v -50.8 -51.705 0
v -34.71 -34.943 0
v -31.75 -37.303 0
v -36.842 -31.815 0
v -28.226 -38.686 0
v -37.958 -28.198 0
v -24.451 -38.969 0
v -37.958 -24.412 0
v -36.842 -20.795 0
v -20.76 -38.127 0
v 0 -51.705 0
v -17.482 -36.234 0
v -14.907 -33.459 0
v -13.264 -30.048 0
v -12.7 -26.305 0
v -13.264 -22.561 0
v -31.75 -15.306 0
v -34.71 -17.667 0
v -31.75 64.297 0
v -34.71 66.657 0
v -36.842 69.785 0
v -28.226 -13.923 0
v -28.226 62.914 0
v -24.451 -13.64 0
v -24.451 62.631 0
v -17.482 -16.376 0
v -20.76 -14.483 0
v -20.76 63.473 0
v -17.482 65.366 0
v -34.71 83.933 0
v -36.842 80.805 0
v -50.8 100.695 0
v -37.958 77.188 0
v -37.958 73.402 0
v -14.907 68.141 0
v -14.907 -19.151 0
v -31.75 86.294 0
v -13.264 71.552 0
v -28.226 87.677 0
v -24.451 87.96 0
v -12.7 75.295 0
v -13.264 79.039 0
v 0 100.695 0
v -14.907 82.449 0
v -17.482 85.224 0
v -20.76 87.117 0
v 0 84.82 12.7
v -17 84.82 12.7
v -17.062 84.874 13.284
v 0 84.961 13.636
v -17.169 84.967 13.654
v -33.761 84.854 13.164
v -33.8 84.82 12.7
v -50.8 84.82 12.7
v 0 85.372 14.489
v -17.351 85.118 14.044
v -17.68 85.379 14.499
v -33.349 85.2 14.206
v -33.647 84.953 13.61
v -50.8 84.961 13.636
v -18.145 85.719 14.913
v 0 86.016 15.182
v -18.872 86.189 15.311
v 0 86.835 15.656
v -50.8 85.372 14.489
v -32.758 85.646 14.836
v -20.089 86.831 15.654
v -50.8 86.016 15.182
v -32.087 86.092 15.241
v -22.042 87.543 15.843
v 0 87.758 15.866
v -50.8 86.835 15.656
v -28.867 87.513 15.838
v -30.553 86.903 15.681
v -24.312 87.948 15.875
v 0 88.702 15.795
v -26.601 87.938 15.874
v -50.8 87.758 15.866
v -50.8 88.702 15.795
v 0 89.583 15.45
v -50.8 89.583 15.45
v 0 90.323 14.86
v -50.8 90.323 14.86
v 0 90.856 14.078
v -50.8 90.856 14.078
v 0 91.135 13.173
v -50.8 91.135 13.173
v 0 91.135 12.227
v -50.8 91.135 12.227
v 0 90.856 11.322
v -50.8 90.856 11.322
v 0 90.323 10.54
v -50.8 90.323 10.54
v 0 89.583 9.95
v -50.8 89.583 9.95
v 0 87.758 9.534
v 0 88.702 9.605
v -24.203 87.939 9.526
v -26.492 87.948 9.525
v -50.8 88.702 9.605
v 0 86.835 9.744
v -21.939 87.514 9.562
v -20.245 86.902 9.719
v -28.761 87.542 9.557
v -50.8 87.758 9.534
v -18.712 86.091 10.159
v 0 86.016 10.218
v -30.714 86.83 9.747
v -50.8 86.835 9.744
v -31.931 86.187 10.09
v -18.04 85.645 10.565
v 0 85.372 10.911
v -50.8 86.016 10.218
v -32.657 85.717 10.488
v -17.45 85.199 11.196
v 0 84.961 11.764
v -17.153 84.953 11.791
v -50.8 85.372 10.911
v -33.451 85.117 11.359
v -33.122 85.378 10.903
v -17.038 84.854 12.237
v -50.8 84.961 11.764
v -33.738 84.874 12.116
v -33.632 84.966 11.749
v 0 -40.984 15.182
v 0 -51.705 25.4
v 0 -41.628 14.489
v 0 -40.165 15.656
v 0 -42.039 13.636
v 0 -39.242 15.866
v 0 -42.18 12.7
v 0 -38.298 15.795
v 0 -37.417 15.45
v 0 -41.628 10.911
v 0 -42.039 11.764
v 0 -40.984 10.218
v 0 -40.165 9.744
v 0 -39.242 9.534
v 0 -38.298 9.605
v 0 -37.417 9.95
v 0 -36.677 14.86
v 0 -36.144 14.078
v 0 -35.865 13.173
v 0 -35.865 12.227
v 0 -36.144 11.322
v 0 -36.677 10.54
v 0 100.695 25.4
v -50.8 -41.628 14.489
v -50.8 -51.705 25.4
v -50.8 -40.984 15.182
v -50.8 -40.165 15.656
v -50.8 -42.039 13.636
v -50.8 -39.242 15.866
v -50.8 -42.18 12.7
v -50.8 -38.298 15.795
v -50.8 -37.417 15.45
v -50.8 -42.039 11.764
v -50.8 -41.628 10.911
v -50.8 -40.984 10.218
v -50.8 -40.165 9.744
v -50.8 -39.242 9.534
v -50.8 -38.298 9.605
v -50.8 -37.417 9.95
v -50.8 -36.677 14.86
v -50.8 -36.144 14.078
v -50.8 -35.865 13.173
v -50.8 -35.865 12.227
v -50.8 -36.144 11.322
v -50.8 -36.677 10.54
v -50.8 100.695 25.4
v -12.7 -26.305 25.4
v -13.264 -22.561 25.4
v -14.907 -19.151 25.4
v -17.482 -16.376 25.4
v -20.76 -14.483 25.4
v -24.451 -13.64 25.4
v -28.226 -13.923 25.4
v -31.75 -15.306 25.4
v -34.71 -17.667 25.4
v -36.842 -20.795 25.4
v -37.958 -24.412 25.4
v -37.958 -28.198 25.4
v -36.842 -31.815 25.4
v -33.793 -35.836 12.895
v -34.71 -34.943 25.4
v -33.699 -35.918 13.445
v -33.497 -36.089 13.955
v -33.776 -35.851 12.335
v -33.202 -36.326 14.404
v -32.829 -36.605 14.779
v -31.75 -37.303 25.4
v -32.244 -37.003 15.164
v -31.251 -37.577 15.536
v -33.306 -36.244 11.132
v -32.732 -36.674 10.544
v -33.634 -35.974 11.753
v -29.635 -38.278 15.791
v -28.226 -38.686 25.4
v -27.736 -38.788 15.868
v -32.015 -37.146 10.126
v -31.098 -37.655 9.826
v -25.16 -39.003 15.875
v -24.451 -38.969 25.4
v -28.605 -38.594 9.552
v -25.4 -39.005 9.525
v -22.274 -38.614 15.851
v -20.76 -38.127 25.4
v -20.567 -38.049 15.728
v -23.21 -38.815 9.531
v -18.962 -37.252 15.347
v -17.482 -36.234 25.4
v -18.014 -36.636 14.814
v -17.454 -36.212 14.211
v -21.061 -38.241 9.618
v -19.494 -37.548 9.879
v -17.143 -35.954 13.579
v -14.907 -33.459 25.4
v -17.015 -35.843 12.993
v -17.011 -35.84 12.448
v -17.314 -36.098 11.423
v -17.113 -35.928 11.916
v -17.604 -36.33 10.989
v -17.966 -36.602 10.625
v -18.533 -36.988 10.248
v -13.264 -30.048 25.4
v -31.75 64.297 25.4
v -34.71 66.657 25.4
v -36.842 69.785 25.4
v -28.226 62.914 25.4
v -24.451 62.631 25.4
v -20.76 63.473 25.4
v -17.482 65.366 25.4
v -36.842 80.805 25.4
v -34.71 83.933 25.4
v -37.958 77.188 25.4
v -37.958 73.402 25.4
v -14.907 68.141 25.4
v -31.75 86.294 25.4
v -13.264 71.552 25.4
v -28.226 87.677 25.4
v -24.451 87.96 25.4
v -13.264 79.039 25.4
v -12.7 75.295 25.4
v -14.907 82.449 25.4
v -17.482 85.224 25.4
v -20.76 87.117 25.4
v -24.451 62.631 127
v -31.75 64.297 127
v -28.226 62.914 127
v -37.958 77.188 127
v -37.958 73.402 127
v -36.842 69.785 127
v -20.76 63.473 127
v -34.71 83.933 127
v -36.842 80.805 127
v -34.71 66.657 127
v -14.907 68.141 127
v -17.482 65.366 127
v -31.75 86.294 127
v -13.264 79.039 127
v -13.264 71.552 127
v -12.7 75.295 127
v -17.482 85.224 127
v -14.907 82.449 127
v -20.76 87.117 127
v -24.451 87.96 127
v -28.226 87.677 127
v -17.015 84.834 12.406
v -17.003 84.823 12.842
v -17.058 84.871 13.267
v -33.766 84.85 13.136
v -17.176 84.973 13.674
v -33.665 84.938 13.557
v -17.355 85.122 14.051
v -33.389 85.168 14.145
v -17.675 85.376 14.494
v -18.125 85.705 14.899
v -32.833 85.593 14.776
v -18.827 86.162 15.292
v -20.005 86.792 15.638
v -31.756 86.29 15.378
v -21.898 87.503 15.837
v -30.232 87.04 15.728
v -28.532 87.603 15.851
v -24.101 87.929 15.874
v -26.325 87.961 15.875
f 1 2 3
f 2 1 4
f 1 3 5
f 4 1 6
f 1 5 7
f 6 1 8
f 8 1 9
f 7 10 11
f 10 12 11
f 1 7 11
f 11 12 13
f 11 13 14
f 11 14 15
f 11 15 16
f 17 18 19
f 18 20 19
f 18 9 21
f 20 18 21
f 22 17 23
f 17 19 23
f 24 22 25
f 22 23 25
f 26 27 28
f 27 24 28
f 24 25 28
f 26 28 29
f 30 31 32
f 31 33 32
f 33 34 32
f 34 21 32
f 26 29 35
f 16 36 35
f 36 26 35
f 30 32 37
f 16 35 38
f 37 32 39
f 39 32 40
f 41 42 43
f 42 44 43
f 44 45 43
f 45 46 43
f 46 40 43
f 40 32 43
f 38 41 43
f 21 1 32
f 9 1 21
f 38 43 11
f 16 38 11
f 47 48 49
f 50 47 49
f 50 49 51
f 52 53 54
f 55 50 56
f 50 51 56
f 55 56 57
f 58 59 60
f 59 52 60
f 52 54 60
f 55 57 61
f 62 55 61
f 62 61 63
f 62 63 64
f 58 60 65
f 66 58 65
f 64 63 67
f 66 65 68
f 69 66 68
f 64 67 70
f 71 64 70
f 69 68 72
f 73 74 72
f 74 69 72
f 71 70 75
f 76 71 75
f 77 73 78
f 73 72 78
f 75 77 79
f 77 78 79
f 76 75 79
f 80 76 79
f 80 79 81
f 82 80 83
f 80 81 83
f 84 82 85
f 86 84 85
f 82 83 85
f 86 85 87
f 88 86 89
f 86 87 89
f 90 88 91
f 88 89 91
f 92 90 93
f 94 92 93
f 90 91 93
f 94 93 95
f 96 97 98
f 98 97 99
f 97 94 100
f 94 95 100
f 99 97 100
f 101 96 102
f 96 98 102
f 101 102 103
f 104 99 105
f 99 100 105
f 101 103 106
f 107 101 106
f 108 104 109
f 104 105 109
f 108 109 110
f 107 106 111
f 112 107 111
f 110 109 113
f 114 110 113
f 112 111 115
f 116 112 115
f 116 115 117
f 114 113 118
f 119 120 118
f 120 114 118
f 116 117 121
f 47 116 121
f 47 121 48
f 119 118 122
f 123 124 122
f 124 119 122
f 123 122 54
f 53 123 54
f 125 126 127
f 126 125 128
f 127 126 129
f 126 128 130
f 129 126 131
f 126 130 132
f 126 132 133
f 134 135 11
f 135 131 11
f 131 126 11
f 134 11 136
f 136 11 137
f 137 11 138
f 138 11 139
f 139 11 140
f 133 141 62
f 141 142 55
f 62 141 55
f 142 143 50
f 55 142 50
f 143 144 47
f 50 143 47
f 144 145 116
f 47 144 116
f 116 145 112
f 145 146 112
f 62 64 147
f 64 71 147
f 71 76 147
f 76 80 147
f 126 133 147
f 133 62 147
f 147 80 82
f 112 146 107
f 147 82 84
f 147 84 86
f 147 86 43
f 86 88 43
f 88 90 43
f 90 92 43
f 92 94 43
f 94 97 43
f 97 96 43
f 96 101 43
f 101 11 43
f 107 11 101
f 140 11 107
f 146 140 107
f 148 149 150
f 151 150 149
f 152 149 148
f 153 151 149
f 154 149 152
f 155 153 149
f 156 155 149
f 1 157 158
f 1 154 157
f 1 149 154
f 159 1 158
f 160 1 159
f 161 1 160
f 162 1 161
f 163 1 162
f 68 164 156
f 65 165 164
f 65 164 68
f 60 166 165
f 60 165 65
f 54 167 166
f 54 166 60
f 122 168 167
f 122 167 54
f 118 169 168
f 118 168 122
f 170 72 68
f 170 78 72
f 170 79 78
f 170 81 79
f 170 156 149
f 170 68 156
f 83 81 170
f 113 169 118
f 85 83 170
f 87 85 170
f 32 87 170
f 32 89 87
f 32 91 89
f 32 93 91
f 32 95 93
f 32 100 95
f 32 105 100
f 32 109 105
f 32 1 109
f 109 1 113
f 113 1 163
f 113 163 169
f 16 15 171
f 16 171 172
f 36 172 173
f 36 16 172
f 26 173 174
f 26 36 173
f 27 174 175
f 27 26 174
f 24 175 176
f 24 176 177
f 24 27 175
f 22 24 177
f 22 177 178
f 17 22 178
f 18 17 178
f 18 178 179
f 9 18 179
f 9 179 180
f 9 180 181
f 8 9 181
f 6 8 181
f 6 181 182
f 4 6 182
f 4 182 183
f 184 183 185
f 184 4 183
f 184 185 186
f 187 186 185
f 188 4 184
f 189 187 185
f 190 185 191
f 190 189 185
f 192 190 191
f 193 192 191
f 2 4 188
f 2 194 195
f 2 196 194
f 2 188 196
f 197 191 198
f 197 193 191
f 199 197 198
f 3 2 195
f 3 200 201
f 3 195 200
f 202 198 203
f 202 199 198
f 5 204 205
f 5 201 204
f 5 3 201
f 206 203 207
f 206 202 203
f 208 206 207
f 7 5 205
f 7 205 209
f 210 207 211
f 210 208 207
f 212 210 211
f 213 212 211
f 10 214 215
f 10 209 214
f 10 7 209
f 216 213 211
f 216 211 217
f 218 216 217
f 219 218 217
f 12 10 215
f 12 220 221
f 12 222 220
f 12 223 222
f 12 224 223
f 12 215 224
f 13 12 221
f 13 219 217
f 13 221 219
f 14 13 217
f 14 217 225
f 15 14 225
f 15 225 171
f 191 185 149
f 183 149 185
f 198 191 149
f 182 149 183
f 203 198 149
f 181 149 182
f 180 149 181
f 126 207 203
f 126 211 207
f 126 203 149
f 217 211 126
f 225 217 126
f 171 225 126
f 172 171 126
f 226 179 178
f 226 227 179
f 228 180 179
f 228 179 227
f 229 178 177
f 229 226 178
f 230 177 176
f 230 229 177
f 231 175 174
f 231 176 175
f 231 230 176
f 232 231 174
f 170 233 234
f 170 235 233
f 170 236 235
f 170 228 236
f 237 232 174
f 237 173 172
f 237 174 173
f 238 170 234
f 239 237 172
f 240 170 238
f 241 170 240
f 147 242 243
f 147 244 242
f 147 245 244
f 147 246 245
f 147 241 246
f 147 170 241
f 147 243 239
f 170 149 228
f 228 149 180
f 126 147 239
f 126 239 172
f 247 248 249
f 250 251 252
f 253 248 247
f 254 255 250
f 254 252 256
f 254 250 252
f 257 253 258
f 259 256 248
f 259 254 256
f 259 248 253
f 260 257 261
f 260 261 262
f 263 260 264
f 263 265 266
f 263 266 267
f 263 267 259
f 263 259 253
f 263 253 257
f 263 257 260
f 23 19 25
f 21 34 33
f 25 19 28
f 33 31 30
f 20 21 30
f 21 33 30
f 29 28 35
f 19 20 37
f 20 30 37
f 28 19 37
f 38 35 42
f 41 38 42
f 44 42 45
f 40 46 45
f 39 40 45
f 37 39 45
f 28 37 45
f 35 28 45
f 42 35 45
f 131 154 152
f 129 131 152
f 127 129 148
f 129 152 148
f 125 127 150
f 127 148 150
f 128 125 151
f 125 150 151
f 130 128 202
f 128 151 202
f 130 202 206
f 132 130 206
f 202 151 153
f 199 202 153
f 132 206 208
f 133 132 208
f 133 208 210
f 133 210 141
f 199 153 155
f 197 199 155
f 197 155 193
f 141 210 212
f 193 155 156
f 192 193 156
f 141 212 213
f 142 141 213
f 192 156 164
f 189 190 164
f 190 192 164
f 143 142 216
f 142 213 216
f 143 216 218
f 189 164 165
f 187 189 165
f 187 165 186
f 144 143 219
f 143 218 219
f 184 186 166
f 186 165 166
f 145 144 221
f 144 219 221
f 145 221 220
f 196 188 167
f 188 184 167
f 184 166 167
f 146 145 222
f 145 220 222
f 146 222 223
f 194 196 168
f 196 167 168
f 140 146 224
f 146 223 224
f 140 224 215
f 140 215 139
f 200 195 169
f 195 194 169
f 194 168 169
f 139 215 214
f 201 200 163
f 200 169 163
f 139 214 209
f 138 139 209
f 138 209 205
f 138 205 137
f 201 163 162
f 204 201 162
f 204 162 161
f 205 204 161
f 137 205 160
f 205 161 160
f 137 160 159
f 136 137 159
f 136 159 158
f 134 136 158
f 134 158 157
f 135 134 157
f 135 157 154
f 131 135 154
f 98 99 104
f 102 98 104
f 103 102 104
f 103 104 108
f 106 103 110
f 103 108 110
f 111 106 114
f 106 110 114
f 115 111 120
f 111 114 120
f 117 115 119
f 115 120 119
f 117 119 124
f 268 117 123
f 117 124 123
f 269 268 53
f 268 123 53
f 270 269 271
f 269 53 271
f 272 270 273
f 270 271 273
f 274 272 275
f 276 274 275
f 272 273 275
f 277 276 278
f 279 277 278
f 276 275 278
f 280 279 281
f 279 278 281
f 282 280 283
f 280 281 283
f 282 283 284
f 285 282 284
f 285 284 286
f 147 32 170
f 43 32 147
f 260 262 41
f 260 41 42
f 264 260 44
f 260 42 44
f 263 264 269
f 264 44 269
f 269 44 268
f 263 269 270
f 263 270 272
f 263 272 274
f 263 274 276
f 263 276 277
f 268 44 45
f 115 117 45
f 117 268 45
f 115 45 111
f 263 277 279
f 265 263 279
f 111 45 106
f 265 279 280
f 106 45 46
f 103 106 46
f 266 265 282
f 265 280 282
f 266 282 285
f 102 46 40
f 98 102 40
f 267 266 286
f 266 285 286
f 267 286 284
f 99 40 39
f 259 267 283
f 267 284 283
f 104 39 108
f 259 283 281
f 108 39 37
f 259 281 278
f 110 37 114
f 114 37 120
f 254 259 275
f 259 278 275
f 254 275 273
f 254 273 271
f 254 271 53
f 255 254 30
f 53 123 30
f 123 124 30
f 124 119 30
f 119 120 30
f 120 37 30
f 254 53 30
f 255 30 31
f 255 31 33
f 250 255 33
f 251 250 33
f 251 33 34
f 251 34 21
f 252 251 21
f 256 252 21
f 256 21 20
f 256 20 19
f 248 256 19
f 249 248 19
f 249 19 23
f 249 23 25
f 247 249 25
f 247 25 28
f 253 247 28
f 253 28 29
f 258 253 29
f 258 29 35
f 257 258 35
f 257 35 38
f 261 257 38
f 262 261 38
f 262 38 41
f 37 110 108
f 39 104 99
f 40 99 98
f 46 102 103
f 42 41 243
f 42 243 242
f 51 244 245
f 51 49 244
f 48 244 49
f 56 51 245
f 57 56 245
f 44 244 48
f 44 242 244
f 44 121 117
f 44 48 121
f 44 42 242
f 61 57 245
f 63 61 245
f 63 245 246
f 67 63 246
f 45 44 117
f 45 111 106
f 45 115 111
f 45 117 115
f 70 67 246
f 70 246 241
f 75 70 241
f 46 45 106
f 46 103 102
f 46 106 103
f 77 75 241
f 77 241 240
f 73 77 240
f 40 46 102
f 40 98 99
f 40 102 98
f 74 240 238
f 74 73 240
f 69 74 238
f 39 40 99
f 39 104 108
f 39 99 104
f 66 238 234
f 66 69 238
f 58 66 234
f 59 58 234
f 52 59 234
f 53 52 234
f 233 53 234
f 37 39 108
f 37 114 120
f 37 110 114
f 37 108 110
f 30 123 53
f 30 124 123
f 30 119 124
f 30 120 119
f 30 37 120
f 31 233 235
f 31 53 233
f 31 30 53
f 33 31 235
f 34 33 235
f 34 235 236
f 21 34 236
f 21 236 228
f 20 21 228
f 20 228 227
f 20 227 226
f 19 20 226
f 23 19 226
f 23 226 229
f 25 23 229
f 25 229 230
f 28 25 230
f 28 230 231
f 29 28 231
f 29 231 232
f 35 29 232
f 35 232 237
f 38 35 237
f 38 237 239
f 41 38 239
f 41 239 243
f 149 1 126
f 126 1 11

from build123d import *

# Parameters (mm, degrees)
F0_R     = 12.7
F1_DEPTH = 127
F0_W     = 50.8
F0_H     = 152.4
F2_DEPTH = 25.4
F3_R     = 3.175
F4_DEPTH = 50.801


with BuildPart() as f1:
    # F0 (on Top) → F1 (new body)
    with BuildSketch(Plane.XY):
        with Locations((-25.4, 75.295159)):
            Circle(F0_R)
    extrude(amount=F1_DEPTH)


with BuildPart() as f2:
    # F0 (on Top) → F2 (new body)
    with BuildSketch(Plane.XY):
        with Locations((-25.4, 24.495159)):
            Rectangle(F0_W, F0_H)
        with Locations((-25.4, -26.304841)):
            Circle(F0_R, mode=Mode.SUBTRACT)
        with Locations((-25.4, 75.295159)):
            Circle(F0_R, mode=Mode.SUBTRACT)
    extrude(amount=F2_DEPTH)


with BuildPart() as f4_tool:
    # F3 (on face) → F4 (new body, through all)
    with BuildSketch(Plane(origin=(-50.8, 0, 0), x_dir=(0, -1, 0), z_dir=(-1, 0, 0))):
        with Locations((-87.995159, 12.7)):
            Circle(F3_R)
        with Locations((39.004841, 12.7)):
            Circle(F3_R)
    extrude(amount=-F4_DEPTH)


with BuildPart() as f1_1:
    add(f1.part)

    # F4: cut by f4_tool
    add(f4_tool.part, mode=Mode.SUBTRACT)


with BuildPart() as f2_1:
    add(f2.part)

    # F4: cut by f4_tool
    add(f4_tool.part, mode=Mode.SUBTRACT)


solid = Compound([f1_1.part, f2_1.part])
